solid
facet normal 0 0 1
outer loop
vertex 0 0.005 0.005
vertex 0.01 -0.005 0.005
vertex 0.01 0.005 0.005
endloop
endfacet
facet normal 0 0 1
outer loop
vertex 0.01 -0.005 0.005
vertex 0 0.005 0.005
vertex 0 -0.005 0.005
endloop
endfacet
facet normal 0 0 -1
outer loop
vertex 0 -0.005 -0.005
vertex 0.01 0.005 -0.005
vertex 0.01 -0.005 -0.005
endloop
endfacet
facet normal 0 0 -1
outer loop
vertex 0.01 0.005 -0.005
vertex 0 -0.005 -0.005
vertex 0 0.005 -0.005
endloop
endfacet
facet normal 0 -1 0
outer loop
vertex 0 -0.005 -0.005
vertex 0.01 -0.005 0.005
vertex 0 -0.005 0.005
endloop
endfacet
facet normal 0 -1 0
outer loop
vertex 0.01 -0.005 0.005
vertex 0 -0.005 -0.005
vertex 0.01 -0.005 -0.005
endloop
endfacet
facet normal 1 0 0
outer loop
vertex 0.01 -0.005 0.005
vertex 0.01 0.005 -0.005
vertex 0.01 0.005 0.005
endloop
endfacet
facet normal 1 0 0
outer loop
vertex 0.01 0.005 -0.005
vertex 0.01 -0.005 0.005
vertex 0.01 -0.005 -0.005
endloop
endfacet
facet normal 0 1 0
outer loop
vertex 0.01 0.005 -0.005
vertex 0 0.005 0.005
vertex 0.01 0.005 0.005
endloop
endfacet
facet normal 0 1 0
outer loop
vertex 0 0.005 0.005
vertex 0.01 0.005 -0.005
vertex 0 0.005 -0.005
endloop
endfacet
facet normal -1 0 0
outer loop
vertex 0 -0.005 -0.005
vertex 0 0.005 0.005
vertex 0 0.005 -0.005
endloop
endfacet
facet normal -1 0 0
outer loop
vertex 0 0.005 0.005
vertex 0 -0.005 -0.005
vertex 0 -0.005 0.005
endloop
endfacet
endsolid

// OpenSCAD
translate([0.005,0,0]) {
    cube([0.01,0.01,0.01],true);
}
